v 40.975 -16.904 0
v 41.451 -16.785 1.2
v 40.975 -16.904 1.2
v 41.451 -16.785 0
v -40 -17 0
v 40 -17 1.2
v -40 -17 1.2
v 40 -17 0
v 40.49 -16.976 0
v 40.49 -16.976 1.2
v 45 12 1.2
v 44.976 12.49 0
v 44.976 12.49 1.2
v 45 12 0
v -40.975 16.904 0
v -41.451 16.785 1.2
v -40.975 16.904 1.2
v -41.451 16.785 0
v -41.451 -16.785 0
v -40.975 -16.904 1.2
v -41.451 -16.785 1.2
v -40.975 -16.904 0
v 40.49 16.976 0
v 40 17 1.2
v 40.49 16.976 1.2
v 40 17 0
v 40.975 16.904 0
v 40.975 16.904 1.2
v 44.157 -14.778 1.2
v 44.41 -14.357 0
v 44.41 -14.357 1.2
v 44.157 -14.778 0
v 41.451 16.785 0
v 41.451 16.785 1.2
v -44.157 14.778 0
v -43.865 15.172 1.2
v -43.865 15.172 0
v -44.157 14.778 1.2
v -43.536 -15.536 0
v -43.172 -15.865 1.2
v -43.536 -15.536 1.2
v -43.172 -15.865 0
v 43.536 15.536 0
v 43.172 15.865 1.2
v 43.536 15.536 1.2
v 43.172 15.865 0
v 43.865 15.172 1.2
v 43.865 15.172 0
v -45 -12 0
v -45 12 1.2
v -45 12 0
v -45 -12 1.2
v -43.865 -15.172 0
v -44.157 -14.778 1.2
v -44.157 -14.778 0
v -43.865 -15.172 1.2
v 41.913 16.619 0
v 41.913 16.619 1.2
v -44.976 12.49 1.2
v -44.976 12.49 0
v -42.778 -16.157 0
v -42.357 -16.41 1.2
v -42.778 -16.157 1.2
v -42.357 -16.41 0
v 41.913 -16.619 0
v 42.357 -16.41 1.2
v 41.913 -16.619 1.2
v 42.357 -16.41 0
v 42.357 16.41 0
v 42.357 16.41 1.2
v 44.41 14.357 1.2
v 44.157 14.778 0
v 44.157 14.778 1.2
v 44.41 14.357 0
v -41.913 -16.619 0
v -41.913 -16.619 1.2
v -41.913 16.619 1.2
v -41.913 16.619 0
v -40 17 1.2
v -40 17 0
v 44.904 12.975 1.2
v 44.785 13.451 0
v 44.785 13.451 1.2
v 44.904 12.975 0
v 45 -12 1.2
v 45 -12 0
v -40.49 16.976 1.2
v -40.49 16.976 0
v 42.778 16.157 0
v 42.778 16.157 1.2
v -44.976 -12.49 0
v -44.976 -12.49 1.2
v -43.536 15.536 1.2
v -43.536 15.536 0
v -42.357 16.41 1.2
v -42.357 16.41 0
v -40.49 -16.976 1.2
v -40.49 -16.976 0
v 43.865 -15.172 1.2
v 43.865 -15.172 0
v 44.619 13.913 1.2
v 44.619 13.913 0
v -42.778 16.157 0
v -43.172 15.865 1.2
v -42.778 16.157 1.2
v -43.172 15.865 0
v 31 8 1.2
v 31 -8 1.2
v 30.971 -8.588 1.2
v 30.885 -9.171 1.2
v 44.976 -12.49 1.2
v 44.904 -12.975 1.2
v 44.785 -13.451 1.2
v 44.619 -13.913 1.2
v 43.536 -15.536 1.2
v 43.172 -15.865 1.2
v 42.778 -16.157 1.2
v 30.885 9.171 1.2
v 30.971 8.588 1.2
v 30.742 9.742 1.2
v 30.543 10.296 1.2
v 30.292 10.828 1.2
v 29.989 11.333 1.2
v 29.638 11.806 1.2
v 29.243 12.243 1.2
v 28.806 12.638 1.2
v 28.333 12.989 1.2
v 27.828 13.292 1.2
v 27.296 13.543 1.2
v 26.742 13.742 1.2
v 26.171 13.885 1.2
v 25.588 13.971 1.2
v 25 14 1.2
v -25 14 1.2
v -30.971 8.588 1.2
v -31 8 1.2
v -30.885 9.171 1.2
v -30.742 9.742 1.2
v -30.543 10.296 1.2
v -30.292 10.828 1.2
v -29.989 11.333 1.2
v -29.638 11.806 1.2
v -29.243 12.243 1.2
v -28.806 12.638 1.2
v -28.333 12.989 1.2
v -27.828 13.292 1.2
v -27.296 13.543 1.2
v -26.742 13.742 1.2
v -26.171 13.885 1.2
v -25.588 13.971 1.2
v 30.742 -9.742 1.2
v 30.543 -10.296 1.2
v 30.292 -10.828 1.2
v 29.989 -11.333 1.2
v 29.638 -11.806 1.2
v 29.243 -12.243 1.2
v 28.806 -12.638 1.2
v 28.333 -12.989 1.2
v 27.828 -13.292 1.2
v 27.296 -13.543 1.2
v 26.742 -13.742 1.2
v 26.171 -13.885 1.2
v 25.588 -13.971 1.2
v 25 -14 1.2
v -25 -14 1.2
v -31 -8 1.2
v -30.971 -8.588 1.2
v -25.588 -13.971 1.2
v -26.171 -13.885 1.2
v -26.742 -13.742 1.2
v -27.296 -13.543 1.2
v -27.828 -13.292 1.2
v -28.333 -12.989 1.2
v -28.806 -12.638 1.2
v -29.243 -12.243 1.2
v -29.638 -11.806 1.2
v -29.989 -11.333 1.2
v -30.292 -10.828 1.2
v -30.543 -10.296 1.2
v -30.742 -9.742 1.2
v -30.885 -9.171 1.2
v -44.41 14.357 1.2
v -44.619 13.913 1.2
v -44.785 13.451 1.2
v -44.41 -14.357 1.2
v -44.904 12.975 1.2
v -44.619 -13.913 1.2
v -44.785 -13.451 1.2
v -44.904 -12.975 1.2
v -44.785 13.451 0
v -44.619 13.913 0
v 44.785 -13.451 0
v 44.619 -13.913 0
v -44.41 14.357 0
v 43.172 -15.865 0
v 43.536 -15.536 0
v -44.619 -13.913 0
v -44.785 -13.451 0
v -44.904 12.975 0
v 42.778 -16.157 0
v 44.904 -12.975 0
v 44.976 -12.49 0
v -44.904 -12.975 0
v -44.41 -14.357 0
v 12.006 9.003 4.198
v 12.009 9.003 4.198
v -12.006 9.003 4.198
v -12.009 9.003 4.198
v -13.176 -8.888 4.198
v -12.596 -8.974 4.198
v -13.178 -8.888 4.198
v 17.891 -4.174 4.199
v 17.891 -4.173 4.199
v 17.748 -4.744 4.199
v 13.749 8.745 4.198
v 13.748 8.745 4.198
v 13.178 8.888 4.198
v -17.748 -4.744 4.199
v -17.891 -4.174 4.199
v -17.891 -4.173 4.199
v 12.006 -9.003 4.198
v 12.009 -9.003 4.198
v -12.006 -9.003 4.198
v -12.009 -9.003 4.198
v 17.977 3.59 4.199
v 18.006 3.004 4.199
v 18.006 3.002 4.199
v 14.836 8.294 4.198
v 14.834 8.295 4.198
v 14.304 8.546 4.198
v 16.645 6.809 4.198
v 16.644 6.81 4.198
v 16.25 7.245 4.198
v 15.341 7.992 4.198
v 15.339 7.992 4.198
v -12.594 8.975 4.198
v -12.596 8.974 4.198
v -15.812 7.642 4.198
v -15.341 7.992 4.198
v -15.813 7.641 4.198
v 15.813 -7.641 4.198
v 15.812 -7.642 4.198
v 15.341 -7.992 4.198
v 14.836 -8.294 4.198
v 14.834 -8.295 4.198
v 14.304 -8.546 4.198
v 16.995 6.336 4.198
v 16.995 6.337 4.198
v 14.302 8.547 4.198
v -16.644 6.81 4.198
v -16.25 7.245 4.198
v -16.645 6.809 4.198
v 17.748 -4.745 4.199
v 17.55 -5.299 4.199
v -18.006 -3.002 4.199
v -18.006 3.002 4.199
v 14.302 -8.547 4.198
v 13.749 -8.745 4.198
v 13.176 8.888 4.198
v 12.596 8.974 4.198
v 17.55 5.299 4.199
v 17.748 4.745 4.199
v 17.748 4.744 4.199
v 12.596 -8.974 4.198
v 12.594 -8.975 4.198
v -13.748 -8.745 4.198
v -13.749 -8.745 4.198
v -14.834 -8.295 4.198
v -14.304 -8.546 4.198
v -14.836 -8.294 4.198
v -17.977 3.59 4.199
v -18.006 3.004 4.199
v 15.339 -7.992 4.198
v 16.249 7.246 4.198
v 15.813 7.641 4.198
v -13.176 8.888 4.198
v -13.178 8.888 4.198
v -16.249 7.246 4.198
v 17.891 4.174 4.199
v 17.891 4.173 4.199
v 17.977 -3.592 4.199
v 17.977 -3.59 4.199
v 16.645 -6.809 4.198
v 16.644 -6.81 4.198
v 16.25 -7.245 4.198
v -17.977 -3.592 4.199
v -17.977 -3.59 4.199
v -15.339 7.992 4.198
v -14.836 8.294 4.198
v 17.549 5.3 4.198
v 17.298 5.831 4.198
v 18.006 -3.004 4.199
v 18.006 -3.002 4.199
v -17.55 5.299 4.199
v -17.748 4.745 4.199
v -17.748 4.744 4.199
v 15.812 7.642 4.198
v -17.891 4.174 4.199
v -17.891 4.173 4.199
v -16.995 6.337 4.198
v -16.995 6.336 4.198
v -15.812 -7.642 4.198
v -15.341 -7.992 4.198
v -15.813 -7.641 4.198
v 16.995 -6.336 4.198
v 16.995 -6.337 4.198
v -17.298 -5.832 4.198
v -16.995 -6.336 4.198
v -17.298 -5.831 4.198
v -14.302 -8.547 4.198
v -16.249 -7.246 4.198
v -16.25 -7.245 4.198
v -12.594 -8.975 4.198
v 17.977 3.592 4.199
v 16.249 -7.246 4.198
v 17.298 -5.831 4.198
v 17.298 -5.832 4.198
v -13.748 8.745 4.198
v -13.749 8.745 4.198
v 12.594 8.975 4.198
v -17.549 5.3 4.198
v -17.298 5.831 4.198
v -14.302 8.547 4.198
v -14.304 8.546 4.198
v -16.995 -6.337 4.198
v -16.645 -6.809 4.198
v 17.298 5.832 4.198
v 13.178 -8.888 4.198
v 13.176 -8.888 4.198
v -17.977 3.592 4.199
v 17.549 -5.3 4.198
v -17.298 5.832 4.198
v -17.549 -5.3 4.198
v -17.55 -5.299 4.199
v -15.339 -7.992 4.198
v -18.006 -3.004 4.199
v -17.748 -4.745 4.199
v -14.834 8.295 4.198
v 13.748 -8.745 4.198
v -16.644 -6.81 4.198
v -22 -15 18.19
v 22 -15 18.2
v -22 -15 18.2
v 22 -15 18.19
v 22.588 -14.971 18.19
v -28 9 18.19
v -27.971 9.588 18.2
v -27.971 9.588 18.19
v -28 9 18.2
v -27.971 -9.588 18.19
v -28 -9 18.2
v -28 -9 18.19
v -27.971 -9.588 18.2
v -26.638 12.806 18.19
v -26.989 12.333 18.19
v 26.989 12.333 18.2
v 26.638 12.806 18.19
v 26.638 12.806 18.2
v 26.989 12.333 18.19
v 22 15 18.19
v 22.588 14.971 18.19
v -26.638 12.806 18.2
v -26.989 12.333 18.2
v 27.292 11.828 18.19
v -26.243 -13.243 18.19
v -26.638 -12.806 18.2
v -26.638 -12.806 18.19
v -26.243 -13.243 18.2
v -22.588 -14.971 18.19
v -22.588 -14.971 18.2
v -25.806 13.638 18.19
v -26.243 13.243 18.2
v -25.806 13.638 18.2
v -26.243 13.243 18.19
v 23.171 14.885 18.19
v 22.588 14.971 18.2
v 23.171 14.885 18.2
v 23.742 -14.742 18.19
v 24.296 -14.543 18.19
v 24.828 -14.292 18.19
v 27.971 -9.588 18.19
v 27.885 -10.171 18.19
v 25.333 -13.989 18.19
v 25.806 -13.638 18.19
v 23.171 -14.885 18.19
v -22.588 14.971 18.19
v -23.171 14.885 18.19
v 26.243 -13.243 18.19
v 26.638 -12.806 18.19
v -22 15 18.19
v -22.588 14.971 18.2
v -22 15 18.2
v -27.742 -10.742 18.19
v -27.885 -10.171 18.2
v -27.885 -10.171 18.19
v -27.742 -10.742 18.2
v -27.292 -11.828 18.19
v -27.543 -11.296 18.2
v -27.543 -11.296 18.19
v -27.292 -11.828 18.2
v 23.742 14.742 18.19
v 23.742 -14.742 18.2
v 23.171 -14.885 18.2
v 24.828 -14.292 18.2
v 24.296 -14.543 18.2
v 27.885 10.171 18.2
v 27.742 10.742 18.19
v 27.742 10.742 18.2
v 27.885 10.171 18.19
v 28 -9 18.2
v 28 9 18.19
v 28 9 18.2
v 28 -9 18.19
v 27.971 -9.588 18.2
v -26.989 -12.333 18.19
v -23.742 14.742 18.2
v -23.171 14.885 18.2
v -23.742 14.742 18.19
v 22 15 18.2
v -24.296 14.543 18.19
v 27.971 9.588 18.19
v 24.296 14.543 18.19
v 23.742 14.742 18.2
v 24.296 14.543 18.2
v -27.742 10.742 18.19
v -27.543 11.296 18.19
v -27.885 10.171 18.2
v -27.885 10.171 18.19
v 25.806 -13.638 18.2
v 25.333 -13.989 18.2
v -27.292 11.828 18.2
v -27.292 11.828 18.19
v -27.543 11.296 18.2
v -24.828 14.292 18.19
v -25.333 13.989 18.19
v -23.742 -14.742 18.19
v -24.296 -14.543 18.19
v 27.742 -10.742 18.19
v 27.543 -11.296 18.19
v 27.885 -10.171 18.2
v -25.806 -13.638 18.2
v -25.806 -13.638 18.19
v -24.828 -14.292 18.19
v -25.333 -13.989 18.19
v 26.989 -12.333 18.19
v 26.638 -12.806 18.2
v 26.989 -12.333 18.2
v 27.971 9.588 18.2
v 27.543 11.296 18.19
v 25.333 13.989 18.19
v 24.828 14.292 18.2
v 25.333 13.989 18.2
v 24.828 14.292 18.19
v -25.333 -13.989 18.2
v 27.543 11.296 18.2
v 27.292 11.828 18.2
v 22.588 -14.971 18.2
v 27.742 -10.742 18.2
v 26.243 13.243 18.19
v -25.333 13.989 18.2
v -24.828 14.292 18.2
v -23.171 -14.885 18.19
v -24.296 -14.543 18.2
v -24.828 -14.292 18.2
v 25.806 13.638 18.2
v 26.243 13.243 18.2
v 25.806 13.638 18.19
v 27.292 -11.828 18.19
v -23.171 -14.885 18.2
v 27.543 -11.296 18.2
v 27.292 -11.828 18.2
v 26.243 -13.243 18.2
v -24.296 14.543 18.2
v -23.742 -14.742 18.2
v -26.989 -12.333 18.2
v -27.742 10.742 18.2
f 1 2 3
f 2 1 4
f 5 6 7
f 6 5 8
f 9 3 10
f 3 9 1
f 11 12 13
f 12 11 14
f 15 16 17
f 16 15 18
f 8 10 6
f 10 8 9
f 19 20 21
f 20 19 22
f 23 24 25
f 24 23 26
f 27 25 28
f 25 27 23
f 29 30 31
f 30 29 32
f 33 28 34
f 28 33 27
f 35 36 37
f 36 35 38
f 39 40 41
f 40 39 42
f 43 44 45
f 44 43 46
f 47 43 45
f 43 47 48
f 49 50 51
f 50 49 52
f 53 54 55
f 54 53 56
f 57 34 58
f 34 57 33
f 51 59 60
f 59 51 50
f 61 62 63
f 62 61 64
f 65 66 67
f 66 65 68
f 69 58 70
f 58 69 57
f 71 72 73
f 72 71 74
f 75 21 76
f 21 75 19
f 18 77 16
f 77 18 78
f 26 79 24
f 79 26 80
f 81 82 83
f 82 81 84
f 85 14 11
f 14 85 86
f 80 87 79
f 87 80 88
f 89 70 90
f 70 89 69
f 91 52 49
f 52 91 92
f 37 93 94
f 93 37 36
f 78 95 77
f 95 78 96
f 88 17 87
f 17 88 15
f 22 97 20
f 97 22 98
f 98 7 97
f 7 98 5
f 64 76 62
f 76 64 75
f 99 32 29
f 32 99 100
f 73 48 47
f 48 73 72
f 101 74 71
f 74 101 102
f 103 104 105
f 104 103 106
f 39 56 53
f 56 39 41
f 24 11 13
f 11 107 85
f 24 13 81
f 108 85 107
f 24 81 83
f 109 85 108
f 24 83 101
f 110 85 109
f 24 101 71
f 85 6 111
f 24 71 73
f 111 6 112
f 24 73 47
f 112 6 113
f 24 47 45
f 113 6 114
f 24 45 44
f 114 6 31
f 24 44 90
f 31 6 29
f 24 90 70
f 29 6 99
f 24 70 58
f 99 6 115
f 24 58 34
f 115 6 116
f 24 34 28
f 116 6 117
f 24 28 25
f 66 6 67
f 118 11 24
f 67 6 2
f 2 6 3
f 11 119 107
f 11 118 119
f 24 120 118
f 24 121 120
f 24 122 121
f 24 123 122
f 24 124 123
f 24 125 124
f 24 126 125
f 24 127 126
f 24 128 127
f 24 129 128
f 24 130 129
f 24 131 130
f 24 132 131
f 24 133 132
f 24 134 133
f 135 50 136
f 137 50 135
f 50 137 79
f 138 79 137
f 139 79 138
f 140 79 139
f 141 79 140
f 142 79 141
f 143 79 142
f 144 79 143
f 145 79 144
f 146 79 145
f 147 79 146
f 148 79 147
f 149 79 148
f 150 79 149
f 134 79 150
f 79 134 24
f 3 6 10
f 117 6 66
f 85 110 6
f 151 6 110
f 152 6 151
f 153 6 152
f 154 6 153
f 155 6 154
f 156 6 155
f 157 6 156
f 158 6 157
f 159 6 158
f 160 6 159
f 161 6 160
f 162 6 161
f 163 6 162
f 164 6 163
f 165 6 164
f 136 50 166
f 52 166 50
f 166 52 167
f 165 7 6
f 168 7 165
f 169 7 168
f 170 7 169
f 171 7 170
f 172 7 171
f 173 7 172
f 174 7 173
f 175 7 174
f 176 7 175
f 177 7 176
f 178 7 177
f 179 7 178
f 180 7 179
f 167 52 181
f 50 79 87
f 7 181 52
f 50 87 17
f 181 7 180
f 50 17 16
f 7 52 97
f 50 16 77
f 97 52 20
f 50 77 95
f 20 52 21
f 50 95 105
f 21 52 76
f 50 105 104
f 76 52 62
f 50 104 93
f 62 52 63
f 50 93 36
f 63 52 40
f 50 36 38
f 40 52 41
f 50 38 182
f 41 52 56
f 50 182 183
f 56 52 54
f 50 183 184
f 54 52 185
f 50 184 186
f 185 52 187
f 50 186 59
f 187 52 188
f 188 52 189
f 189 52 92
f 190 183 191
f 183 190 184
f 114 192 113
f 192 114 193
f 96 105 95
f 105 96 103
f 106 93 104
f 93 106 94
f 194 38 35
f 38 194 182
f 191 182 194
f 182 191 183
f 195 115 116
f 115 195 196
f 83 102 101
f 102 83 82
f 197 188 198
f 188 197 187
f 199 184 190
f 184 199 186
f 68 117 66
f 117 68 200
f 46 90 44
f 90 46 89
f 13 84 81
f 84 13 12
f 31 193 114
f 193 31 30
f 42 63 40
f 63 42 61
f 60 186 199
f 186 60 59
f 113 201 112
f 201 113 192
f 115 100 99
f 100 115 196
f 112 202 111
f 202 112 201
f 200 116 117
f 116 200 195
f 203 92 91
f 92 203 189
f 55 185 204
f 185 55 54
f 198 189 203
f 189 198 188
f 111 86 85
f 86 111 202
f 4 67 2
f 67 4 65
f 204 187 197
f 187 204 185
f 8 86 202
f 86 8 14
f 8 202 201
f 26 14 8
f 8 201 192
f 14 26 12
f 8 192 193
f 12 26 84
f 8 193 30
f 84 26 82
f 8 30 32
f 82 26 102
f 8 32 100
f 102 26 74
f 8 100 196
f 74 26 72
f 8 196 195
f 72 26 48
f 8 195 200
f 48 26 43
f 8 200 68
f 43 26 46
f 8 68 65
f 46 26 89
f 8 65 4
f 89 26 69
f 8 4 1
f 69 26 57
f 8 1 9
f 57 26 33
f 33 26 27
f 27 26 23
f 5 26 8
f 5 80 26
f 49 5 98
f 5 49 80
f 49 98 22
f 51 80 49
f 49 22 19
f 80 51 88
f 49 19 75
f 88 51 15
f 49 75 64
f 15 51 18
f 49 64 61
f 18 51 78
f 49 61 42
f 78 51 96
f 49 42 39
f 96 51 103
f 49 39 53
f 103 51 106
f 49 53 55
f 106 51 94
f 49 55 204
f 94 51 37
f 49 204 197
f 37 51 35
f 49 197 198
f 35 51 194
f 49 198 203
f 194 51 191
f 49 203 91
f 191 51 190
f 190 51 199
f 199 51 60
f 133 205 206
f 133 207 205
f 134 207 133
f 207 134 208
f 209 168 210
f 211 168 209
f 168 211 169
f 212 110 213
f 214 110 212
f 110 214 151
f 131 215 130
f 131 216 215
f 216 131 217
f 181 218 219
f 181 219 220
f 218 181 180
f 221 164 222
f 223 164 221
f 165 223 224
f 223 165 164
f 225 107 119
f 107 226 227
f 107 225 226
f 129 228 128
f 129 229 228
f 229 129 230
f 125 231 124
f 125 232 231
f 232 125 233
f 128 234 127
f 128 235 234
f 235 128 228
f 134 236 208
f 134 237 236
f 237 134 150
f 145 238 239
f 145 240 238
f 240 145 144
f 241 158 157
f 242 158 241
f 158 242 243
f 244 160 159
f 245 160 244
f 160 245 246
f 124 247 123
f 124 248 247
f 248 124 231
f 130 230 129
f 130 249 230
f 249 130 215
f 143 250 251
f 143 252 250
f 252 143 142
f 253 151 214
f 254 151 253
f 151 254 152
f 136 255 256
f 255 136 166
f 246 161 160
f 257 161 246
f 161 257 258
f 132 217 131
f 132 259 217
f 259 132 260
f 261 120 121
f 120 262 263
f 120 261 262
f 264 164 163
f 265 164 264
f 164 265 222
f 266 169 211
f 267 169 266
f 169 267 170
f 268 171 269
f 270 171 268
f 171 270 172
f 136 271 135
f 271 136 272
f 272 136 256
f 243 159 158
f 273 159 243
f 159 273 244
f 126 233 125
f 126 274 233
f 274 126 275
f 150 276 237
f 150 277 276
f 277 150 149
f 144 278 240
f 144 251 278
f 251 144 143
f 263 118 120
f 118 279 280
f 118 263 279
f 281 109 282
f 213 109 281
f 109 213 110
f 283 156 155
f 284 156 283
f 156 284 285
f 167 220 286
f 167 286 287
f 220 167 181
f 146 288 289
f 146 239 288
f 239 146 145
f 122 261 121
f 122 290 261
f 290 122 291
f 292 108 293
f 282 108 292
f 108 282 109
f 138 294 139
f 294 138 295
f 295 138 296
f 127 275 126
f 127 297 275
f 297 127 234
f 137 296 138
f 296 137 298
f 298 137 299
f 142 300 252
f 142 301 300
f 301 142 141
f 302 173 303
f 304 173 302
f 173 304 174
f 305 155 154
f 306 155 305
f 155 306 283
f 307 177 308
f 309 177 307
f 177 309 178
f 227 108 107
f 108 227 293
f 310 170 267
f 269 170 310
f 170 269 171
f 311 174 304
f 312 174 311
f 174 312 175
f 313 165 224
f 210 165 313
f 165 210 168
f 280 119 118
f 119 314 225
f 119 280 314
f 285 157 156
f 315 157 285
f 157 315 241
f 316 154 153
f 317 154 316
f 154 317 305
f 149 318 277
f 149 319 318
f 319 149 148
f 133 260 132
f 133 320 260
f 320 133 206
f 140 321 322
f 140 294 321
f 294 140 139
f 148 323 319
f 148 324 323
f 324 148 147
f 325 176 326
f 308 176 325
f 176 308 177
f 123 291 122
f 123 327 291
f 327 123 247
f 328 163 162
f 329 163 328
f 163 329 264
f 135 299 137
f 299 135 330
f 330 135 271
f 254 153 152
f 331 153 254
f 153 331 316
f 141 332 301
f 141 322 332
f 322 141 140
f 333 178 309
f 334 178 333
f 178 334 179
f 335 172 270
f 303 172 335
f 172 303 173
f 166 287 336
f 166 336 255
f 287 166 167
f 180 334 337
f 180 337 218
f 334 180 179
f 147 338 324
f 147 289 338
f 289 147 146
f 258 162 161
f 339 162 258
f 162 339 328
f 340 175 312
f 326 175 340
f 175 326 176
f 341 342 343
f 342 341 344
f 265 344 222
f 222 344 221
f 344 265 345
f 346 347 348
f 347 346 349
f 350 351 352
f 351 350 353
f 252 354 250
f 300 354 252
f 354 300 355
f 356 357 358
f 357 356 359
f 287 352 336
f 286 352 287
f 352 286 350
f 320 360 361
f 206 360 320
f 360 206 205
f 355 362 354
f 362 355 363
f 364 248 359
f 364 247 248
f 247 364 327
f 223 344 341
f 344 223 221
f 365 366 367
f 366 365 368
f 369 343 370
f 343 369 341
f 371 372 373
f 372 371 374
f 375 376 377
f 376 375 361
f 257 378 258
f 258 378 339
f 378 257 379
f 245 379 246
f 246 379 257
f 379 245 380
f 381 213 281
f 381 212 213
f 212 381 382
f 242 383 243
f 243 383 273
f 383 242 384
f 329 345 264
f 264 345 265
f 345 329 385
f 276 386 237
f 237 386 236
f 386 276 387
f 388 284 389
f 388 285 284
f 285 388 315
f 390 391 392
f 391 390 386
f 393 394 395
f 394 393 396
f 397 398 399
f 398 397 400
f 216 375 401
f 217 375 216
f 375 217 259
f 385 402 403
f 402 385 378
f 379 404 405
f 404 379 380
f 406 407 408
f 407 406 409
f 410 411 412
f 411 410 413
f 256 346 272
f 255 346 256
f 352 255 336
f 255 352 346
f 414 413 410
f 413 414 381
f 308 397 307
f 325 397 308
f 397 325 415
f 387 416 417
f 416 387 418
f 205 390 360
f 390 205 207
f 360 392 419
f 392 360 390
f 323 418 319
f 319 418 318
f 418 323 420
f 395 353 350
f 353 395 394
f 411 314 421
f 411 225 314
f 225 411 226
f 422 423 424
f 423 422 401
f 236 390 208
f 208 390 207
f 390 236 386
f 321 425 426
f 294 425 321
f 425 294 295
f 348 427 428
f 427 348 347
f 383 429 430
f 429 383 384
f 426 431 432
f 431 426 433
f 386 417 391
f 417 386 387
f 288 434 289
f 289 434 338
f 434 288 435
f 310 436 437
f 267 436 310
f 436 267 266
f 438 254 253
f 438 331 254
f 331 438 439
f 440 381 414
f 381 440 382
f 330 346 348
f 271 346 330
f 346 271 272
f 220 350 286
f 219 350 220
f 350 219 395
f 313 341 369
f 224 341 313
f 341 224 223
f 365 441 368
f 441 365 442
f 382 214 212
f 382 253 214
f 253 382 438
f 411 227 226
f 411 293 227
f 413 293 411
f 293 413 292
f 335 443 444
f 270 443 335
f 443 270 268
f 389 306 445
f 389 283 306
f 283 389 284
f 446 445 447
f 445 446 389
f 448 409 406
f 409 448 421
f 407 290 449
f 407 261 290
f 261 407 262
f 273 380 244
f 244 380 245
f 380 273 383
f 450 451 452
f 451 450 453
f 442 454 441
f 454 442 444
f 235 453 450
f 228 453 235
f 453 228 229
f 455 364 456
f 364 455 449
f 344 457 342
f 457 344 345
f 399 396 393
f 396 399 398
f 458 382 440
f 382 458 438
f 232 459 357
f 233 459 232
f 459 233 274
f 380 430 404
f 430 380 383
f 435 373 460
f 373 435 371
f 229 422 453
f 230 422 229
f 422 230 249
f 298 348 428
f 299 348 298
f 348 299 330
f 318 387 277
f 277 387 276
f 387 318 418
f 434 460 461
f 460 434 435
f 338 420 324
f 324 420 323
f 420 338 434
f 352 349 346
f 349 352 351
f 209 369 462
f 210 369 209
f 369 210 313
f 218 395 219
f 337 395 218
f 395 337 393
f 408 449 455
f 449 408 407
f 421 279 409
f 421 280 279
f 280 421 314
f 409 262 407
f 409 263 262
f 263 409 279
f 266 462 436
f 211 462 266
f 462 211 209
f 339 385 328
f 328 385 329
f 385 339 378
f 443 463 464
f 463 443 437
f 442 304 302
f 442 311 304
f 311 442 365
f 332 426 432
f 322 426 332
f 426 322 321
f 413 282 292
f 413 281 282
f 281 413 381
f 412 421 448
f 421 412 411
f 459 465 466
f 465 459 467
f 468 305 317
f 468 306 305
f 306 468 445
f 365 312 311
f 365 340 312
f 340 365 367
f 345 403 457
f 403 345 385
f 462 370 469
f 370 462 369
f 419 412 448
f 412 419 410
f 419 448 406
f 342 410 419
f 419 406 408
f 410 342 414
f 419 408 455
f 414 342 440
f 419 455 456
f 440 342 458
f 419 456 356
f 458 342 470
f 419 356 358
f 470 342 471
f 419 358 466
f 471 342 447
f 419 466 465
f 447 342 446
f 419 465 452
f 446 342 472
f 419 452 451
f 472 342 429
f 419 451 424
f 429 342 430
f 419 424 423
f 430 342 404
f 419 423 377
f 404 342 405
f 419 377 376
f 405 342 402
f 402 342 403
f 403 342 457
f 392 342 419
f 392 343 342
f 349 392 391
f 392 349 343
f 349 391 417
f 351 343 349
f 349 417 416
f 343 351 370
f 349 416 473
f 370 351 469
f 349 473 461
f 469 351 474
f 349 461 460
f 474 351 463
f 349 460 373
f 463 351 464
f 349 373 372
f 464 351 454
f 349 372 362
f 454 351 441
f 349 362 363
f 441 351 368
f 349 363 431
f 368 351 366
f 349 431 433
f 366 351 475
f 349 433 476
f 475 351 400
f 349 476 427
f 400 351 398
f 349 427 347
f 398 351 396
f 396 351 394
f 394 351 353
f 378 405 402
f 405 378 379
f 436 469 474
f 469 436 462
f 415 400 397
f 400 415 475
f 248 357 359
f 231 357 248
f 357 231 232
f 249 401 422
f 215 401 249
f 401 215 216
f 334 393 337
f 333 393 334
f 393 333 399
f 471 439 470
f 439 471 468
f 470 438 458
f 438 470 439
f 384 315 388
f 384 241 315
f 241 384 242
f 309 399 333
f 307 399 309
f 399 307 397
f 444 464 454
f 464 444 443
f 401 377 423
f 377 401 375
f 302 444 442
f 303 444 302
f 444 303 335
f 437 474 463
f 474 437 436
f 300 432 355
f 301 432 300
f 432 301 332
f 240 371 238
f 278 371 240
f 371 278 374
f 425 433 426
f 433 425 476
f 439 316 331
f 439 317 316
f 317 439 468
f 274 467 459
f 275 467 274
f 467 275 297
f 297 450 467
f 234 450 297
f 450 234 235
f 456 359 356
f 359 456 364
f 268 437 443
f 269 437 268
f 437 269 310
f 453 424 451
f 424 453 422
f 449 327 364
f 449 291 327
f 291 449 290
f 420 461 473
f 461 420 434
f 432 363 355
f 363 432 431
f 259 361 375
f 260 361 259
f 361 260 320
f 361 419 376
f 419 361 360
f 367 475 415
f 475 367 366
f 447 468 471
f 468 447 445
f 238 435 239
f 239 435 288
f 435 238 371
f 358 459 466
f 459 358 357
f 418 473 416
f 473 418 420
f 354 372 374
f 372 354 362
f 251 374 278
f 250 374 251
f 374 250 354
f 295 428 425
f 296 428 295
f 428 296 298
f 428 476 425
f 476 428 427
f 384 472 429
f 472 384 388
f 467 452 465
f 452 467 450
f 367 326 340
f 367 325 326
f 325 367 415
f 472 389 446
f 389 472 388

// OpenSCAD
// Hutchfinity optional glue-on knob prototype.
// Version: 0.2.1

$fn = 64;
EPS = 0.01;

BASE_WIDTH = 90.0;
BASE_DEPTH = 34.0;
BASE_THICKNESS = 1.2;
BASE_CORNER_RADIUS = 5.0;

FLARE_WIDTH = 62.0;
FLARE_DEPTH = 28.0;
FLARE_HEIGHT = 3.0;

NECK_WIDTH = 36.0;
NECK_DEPTH = 18.0;
END_BULGE_WIDTH = 56.0;
END_BULGE_DEPTH = 30.0;
GRIP_HEIGHT = 14.0;
GRIP_CORNER_RADIUS = 6.0;

module rounded_box(size, radius) {
    width = size[0];
    depth = size[1];
    height = size[2];
    linear_extrude(height = height)
        offset(r = radius)
            square([max(width - 2 * radius, EPS), max(depth - 2 * radius, EPS)], center = true);
}

module tapered_slug(bottom_size, top_size, height, radius) {
    hull() {
        translate([0, 0, 0])
            rounded_box([bottom_size[0], bottom_size[1], EPS], min(radius, bottom_size[0] / 2 - EPS, bottom_size[1] / 2 - EPS));
        translate([0, 0, height - EPS])
            rounded_box([top_size[0], top_size[1], EPS], min(radius, top_size[0] / 2 - EPS, top_size[1] / 2 - EPS));
    }
}

module hutchfinity_knob(
    base_width = BASE_WIDTH,
    base_depth = BASE_DEPTH,
    base_thickness = BASE_THICKNESS,
    base_corner_radius = BASE_CORNER_RADIUS,
    flare_width = FLARE_WIDTH,
    flare_depth = FLARE_DEPTH,
    flare_height = FLARE_HEIGHT,
    neck_width = NECK_WIDTH,
    neck_depth = NECK_DEPTH,
    end_bulge_width = END_BULGE_WIDTH,
    end_bulge_depth = END_BULGE_DEPTH,
    grip_height = GRIP_HEIGHT,
    grip_corner_radius = GRIP_CORNER_RADIUS
) {
    assert(base_width > end_bulge_width, "base_width must exceed end_bulge_width for a glue flange");
    assert(base_depth > end_bulge_depth, "base_depth must exceed end_bulge_depth for a glue flange");
    assert(end_bulge_width > neck_width, "end_bulge_width should exceed neck_width");
    assert(end_bulge_depth > neck_depth, "end_bulge_depth should exceed neck_depth");

    union() {
        rounded_box([base_width, base_depth, base_thickness], base_corner_radius);

        translate([0, 0, base_thickness - EPS])
            tapered_slug(
                [flare_width, flare_depth],
                [neck_width, neck_depth],
                flare_height + EPS,
                min(grip_corner_radius, flare_depth / 2 - EPS)
            );

        translate([0, 0, base_thickness + flare_height - EPS])
            tapered_slug(
                [neck_width, neck_depth],
                [end_bulge_width, end_bulge_depth],
                grip_height + EPS,
                grip_corner_radius
            );
    }
}

hutchfinity_knob();
